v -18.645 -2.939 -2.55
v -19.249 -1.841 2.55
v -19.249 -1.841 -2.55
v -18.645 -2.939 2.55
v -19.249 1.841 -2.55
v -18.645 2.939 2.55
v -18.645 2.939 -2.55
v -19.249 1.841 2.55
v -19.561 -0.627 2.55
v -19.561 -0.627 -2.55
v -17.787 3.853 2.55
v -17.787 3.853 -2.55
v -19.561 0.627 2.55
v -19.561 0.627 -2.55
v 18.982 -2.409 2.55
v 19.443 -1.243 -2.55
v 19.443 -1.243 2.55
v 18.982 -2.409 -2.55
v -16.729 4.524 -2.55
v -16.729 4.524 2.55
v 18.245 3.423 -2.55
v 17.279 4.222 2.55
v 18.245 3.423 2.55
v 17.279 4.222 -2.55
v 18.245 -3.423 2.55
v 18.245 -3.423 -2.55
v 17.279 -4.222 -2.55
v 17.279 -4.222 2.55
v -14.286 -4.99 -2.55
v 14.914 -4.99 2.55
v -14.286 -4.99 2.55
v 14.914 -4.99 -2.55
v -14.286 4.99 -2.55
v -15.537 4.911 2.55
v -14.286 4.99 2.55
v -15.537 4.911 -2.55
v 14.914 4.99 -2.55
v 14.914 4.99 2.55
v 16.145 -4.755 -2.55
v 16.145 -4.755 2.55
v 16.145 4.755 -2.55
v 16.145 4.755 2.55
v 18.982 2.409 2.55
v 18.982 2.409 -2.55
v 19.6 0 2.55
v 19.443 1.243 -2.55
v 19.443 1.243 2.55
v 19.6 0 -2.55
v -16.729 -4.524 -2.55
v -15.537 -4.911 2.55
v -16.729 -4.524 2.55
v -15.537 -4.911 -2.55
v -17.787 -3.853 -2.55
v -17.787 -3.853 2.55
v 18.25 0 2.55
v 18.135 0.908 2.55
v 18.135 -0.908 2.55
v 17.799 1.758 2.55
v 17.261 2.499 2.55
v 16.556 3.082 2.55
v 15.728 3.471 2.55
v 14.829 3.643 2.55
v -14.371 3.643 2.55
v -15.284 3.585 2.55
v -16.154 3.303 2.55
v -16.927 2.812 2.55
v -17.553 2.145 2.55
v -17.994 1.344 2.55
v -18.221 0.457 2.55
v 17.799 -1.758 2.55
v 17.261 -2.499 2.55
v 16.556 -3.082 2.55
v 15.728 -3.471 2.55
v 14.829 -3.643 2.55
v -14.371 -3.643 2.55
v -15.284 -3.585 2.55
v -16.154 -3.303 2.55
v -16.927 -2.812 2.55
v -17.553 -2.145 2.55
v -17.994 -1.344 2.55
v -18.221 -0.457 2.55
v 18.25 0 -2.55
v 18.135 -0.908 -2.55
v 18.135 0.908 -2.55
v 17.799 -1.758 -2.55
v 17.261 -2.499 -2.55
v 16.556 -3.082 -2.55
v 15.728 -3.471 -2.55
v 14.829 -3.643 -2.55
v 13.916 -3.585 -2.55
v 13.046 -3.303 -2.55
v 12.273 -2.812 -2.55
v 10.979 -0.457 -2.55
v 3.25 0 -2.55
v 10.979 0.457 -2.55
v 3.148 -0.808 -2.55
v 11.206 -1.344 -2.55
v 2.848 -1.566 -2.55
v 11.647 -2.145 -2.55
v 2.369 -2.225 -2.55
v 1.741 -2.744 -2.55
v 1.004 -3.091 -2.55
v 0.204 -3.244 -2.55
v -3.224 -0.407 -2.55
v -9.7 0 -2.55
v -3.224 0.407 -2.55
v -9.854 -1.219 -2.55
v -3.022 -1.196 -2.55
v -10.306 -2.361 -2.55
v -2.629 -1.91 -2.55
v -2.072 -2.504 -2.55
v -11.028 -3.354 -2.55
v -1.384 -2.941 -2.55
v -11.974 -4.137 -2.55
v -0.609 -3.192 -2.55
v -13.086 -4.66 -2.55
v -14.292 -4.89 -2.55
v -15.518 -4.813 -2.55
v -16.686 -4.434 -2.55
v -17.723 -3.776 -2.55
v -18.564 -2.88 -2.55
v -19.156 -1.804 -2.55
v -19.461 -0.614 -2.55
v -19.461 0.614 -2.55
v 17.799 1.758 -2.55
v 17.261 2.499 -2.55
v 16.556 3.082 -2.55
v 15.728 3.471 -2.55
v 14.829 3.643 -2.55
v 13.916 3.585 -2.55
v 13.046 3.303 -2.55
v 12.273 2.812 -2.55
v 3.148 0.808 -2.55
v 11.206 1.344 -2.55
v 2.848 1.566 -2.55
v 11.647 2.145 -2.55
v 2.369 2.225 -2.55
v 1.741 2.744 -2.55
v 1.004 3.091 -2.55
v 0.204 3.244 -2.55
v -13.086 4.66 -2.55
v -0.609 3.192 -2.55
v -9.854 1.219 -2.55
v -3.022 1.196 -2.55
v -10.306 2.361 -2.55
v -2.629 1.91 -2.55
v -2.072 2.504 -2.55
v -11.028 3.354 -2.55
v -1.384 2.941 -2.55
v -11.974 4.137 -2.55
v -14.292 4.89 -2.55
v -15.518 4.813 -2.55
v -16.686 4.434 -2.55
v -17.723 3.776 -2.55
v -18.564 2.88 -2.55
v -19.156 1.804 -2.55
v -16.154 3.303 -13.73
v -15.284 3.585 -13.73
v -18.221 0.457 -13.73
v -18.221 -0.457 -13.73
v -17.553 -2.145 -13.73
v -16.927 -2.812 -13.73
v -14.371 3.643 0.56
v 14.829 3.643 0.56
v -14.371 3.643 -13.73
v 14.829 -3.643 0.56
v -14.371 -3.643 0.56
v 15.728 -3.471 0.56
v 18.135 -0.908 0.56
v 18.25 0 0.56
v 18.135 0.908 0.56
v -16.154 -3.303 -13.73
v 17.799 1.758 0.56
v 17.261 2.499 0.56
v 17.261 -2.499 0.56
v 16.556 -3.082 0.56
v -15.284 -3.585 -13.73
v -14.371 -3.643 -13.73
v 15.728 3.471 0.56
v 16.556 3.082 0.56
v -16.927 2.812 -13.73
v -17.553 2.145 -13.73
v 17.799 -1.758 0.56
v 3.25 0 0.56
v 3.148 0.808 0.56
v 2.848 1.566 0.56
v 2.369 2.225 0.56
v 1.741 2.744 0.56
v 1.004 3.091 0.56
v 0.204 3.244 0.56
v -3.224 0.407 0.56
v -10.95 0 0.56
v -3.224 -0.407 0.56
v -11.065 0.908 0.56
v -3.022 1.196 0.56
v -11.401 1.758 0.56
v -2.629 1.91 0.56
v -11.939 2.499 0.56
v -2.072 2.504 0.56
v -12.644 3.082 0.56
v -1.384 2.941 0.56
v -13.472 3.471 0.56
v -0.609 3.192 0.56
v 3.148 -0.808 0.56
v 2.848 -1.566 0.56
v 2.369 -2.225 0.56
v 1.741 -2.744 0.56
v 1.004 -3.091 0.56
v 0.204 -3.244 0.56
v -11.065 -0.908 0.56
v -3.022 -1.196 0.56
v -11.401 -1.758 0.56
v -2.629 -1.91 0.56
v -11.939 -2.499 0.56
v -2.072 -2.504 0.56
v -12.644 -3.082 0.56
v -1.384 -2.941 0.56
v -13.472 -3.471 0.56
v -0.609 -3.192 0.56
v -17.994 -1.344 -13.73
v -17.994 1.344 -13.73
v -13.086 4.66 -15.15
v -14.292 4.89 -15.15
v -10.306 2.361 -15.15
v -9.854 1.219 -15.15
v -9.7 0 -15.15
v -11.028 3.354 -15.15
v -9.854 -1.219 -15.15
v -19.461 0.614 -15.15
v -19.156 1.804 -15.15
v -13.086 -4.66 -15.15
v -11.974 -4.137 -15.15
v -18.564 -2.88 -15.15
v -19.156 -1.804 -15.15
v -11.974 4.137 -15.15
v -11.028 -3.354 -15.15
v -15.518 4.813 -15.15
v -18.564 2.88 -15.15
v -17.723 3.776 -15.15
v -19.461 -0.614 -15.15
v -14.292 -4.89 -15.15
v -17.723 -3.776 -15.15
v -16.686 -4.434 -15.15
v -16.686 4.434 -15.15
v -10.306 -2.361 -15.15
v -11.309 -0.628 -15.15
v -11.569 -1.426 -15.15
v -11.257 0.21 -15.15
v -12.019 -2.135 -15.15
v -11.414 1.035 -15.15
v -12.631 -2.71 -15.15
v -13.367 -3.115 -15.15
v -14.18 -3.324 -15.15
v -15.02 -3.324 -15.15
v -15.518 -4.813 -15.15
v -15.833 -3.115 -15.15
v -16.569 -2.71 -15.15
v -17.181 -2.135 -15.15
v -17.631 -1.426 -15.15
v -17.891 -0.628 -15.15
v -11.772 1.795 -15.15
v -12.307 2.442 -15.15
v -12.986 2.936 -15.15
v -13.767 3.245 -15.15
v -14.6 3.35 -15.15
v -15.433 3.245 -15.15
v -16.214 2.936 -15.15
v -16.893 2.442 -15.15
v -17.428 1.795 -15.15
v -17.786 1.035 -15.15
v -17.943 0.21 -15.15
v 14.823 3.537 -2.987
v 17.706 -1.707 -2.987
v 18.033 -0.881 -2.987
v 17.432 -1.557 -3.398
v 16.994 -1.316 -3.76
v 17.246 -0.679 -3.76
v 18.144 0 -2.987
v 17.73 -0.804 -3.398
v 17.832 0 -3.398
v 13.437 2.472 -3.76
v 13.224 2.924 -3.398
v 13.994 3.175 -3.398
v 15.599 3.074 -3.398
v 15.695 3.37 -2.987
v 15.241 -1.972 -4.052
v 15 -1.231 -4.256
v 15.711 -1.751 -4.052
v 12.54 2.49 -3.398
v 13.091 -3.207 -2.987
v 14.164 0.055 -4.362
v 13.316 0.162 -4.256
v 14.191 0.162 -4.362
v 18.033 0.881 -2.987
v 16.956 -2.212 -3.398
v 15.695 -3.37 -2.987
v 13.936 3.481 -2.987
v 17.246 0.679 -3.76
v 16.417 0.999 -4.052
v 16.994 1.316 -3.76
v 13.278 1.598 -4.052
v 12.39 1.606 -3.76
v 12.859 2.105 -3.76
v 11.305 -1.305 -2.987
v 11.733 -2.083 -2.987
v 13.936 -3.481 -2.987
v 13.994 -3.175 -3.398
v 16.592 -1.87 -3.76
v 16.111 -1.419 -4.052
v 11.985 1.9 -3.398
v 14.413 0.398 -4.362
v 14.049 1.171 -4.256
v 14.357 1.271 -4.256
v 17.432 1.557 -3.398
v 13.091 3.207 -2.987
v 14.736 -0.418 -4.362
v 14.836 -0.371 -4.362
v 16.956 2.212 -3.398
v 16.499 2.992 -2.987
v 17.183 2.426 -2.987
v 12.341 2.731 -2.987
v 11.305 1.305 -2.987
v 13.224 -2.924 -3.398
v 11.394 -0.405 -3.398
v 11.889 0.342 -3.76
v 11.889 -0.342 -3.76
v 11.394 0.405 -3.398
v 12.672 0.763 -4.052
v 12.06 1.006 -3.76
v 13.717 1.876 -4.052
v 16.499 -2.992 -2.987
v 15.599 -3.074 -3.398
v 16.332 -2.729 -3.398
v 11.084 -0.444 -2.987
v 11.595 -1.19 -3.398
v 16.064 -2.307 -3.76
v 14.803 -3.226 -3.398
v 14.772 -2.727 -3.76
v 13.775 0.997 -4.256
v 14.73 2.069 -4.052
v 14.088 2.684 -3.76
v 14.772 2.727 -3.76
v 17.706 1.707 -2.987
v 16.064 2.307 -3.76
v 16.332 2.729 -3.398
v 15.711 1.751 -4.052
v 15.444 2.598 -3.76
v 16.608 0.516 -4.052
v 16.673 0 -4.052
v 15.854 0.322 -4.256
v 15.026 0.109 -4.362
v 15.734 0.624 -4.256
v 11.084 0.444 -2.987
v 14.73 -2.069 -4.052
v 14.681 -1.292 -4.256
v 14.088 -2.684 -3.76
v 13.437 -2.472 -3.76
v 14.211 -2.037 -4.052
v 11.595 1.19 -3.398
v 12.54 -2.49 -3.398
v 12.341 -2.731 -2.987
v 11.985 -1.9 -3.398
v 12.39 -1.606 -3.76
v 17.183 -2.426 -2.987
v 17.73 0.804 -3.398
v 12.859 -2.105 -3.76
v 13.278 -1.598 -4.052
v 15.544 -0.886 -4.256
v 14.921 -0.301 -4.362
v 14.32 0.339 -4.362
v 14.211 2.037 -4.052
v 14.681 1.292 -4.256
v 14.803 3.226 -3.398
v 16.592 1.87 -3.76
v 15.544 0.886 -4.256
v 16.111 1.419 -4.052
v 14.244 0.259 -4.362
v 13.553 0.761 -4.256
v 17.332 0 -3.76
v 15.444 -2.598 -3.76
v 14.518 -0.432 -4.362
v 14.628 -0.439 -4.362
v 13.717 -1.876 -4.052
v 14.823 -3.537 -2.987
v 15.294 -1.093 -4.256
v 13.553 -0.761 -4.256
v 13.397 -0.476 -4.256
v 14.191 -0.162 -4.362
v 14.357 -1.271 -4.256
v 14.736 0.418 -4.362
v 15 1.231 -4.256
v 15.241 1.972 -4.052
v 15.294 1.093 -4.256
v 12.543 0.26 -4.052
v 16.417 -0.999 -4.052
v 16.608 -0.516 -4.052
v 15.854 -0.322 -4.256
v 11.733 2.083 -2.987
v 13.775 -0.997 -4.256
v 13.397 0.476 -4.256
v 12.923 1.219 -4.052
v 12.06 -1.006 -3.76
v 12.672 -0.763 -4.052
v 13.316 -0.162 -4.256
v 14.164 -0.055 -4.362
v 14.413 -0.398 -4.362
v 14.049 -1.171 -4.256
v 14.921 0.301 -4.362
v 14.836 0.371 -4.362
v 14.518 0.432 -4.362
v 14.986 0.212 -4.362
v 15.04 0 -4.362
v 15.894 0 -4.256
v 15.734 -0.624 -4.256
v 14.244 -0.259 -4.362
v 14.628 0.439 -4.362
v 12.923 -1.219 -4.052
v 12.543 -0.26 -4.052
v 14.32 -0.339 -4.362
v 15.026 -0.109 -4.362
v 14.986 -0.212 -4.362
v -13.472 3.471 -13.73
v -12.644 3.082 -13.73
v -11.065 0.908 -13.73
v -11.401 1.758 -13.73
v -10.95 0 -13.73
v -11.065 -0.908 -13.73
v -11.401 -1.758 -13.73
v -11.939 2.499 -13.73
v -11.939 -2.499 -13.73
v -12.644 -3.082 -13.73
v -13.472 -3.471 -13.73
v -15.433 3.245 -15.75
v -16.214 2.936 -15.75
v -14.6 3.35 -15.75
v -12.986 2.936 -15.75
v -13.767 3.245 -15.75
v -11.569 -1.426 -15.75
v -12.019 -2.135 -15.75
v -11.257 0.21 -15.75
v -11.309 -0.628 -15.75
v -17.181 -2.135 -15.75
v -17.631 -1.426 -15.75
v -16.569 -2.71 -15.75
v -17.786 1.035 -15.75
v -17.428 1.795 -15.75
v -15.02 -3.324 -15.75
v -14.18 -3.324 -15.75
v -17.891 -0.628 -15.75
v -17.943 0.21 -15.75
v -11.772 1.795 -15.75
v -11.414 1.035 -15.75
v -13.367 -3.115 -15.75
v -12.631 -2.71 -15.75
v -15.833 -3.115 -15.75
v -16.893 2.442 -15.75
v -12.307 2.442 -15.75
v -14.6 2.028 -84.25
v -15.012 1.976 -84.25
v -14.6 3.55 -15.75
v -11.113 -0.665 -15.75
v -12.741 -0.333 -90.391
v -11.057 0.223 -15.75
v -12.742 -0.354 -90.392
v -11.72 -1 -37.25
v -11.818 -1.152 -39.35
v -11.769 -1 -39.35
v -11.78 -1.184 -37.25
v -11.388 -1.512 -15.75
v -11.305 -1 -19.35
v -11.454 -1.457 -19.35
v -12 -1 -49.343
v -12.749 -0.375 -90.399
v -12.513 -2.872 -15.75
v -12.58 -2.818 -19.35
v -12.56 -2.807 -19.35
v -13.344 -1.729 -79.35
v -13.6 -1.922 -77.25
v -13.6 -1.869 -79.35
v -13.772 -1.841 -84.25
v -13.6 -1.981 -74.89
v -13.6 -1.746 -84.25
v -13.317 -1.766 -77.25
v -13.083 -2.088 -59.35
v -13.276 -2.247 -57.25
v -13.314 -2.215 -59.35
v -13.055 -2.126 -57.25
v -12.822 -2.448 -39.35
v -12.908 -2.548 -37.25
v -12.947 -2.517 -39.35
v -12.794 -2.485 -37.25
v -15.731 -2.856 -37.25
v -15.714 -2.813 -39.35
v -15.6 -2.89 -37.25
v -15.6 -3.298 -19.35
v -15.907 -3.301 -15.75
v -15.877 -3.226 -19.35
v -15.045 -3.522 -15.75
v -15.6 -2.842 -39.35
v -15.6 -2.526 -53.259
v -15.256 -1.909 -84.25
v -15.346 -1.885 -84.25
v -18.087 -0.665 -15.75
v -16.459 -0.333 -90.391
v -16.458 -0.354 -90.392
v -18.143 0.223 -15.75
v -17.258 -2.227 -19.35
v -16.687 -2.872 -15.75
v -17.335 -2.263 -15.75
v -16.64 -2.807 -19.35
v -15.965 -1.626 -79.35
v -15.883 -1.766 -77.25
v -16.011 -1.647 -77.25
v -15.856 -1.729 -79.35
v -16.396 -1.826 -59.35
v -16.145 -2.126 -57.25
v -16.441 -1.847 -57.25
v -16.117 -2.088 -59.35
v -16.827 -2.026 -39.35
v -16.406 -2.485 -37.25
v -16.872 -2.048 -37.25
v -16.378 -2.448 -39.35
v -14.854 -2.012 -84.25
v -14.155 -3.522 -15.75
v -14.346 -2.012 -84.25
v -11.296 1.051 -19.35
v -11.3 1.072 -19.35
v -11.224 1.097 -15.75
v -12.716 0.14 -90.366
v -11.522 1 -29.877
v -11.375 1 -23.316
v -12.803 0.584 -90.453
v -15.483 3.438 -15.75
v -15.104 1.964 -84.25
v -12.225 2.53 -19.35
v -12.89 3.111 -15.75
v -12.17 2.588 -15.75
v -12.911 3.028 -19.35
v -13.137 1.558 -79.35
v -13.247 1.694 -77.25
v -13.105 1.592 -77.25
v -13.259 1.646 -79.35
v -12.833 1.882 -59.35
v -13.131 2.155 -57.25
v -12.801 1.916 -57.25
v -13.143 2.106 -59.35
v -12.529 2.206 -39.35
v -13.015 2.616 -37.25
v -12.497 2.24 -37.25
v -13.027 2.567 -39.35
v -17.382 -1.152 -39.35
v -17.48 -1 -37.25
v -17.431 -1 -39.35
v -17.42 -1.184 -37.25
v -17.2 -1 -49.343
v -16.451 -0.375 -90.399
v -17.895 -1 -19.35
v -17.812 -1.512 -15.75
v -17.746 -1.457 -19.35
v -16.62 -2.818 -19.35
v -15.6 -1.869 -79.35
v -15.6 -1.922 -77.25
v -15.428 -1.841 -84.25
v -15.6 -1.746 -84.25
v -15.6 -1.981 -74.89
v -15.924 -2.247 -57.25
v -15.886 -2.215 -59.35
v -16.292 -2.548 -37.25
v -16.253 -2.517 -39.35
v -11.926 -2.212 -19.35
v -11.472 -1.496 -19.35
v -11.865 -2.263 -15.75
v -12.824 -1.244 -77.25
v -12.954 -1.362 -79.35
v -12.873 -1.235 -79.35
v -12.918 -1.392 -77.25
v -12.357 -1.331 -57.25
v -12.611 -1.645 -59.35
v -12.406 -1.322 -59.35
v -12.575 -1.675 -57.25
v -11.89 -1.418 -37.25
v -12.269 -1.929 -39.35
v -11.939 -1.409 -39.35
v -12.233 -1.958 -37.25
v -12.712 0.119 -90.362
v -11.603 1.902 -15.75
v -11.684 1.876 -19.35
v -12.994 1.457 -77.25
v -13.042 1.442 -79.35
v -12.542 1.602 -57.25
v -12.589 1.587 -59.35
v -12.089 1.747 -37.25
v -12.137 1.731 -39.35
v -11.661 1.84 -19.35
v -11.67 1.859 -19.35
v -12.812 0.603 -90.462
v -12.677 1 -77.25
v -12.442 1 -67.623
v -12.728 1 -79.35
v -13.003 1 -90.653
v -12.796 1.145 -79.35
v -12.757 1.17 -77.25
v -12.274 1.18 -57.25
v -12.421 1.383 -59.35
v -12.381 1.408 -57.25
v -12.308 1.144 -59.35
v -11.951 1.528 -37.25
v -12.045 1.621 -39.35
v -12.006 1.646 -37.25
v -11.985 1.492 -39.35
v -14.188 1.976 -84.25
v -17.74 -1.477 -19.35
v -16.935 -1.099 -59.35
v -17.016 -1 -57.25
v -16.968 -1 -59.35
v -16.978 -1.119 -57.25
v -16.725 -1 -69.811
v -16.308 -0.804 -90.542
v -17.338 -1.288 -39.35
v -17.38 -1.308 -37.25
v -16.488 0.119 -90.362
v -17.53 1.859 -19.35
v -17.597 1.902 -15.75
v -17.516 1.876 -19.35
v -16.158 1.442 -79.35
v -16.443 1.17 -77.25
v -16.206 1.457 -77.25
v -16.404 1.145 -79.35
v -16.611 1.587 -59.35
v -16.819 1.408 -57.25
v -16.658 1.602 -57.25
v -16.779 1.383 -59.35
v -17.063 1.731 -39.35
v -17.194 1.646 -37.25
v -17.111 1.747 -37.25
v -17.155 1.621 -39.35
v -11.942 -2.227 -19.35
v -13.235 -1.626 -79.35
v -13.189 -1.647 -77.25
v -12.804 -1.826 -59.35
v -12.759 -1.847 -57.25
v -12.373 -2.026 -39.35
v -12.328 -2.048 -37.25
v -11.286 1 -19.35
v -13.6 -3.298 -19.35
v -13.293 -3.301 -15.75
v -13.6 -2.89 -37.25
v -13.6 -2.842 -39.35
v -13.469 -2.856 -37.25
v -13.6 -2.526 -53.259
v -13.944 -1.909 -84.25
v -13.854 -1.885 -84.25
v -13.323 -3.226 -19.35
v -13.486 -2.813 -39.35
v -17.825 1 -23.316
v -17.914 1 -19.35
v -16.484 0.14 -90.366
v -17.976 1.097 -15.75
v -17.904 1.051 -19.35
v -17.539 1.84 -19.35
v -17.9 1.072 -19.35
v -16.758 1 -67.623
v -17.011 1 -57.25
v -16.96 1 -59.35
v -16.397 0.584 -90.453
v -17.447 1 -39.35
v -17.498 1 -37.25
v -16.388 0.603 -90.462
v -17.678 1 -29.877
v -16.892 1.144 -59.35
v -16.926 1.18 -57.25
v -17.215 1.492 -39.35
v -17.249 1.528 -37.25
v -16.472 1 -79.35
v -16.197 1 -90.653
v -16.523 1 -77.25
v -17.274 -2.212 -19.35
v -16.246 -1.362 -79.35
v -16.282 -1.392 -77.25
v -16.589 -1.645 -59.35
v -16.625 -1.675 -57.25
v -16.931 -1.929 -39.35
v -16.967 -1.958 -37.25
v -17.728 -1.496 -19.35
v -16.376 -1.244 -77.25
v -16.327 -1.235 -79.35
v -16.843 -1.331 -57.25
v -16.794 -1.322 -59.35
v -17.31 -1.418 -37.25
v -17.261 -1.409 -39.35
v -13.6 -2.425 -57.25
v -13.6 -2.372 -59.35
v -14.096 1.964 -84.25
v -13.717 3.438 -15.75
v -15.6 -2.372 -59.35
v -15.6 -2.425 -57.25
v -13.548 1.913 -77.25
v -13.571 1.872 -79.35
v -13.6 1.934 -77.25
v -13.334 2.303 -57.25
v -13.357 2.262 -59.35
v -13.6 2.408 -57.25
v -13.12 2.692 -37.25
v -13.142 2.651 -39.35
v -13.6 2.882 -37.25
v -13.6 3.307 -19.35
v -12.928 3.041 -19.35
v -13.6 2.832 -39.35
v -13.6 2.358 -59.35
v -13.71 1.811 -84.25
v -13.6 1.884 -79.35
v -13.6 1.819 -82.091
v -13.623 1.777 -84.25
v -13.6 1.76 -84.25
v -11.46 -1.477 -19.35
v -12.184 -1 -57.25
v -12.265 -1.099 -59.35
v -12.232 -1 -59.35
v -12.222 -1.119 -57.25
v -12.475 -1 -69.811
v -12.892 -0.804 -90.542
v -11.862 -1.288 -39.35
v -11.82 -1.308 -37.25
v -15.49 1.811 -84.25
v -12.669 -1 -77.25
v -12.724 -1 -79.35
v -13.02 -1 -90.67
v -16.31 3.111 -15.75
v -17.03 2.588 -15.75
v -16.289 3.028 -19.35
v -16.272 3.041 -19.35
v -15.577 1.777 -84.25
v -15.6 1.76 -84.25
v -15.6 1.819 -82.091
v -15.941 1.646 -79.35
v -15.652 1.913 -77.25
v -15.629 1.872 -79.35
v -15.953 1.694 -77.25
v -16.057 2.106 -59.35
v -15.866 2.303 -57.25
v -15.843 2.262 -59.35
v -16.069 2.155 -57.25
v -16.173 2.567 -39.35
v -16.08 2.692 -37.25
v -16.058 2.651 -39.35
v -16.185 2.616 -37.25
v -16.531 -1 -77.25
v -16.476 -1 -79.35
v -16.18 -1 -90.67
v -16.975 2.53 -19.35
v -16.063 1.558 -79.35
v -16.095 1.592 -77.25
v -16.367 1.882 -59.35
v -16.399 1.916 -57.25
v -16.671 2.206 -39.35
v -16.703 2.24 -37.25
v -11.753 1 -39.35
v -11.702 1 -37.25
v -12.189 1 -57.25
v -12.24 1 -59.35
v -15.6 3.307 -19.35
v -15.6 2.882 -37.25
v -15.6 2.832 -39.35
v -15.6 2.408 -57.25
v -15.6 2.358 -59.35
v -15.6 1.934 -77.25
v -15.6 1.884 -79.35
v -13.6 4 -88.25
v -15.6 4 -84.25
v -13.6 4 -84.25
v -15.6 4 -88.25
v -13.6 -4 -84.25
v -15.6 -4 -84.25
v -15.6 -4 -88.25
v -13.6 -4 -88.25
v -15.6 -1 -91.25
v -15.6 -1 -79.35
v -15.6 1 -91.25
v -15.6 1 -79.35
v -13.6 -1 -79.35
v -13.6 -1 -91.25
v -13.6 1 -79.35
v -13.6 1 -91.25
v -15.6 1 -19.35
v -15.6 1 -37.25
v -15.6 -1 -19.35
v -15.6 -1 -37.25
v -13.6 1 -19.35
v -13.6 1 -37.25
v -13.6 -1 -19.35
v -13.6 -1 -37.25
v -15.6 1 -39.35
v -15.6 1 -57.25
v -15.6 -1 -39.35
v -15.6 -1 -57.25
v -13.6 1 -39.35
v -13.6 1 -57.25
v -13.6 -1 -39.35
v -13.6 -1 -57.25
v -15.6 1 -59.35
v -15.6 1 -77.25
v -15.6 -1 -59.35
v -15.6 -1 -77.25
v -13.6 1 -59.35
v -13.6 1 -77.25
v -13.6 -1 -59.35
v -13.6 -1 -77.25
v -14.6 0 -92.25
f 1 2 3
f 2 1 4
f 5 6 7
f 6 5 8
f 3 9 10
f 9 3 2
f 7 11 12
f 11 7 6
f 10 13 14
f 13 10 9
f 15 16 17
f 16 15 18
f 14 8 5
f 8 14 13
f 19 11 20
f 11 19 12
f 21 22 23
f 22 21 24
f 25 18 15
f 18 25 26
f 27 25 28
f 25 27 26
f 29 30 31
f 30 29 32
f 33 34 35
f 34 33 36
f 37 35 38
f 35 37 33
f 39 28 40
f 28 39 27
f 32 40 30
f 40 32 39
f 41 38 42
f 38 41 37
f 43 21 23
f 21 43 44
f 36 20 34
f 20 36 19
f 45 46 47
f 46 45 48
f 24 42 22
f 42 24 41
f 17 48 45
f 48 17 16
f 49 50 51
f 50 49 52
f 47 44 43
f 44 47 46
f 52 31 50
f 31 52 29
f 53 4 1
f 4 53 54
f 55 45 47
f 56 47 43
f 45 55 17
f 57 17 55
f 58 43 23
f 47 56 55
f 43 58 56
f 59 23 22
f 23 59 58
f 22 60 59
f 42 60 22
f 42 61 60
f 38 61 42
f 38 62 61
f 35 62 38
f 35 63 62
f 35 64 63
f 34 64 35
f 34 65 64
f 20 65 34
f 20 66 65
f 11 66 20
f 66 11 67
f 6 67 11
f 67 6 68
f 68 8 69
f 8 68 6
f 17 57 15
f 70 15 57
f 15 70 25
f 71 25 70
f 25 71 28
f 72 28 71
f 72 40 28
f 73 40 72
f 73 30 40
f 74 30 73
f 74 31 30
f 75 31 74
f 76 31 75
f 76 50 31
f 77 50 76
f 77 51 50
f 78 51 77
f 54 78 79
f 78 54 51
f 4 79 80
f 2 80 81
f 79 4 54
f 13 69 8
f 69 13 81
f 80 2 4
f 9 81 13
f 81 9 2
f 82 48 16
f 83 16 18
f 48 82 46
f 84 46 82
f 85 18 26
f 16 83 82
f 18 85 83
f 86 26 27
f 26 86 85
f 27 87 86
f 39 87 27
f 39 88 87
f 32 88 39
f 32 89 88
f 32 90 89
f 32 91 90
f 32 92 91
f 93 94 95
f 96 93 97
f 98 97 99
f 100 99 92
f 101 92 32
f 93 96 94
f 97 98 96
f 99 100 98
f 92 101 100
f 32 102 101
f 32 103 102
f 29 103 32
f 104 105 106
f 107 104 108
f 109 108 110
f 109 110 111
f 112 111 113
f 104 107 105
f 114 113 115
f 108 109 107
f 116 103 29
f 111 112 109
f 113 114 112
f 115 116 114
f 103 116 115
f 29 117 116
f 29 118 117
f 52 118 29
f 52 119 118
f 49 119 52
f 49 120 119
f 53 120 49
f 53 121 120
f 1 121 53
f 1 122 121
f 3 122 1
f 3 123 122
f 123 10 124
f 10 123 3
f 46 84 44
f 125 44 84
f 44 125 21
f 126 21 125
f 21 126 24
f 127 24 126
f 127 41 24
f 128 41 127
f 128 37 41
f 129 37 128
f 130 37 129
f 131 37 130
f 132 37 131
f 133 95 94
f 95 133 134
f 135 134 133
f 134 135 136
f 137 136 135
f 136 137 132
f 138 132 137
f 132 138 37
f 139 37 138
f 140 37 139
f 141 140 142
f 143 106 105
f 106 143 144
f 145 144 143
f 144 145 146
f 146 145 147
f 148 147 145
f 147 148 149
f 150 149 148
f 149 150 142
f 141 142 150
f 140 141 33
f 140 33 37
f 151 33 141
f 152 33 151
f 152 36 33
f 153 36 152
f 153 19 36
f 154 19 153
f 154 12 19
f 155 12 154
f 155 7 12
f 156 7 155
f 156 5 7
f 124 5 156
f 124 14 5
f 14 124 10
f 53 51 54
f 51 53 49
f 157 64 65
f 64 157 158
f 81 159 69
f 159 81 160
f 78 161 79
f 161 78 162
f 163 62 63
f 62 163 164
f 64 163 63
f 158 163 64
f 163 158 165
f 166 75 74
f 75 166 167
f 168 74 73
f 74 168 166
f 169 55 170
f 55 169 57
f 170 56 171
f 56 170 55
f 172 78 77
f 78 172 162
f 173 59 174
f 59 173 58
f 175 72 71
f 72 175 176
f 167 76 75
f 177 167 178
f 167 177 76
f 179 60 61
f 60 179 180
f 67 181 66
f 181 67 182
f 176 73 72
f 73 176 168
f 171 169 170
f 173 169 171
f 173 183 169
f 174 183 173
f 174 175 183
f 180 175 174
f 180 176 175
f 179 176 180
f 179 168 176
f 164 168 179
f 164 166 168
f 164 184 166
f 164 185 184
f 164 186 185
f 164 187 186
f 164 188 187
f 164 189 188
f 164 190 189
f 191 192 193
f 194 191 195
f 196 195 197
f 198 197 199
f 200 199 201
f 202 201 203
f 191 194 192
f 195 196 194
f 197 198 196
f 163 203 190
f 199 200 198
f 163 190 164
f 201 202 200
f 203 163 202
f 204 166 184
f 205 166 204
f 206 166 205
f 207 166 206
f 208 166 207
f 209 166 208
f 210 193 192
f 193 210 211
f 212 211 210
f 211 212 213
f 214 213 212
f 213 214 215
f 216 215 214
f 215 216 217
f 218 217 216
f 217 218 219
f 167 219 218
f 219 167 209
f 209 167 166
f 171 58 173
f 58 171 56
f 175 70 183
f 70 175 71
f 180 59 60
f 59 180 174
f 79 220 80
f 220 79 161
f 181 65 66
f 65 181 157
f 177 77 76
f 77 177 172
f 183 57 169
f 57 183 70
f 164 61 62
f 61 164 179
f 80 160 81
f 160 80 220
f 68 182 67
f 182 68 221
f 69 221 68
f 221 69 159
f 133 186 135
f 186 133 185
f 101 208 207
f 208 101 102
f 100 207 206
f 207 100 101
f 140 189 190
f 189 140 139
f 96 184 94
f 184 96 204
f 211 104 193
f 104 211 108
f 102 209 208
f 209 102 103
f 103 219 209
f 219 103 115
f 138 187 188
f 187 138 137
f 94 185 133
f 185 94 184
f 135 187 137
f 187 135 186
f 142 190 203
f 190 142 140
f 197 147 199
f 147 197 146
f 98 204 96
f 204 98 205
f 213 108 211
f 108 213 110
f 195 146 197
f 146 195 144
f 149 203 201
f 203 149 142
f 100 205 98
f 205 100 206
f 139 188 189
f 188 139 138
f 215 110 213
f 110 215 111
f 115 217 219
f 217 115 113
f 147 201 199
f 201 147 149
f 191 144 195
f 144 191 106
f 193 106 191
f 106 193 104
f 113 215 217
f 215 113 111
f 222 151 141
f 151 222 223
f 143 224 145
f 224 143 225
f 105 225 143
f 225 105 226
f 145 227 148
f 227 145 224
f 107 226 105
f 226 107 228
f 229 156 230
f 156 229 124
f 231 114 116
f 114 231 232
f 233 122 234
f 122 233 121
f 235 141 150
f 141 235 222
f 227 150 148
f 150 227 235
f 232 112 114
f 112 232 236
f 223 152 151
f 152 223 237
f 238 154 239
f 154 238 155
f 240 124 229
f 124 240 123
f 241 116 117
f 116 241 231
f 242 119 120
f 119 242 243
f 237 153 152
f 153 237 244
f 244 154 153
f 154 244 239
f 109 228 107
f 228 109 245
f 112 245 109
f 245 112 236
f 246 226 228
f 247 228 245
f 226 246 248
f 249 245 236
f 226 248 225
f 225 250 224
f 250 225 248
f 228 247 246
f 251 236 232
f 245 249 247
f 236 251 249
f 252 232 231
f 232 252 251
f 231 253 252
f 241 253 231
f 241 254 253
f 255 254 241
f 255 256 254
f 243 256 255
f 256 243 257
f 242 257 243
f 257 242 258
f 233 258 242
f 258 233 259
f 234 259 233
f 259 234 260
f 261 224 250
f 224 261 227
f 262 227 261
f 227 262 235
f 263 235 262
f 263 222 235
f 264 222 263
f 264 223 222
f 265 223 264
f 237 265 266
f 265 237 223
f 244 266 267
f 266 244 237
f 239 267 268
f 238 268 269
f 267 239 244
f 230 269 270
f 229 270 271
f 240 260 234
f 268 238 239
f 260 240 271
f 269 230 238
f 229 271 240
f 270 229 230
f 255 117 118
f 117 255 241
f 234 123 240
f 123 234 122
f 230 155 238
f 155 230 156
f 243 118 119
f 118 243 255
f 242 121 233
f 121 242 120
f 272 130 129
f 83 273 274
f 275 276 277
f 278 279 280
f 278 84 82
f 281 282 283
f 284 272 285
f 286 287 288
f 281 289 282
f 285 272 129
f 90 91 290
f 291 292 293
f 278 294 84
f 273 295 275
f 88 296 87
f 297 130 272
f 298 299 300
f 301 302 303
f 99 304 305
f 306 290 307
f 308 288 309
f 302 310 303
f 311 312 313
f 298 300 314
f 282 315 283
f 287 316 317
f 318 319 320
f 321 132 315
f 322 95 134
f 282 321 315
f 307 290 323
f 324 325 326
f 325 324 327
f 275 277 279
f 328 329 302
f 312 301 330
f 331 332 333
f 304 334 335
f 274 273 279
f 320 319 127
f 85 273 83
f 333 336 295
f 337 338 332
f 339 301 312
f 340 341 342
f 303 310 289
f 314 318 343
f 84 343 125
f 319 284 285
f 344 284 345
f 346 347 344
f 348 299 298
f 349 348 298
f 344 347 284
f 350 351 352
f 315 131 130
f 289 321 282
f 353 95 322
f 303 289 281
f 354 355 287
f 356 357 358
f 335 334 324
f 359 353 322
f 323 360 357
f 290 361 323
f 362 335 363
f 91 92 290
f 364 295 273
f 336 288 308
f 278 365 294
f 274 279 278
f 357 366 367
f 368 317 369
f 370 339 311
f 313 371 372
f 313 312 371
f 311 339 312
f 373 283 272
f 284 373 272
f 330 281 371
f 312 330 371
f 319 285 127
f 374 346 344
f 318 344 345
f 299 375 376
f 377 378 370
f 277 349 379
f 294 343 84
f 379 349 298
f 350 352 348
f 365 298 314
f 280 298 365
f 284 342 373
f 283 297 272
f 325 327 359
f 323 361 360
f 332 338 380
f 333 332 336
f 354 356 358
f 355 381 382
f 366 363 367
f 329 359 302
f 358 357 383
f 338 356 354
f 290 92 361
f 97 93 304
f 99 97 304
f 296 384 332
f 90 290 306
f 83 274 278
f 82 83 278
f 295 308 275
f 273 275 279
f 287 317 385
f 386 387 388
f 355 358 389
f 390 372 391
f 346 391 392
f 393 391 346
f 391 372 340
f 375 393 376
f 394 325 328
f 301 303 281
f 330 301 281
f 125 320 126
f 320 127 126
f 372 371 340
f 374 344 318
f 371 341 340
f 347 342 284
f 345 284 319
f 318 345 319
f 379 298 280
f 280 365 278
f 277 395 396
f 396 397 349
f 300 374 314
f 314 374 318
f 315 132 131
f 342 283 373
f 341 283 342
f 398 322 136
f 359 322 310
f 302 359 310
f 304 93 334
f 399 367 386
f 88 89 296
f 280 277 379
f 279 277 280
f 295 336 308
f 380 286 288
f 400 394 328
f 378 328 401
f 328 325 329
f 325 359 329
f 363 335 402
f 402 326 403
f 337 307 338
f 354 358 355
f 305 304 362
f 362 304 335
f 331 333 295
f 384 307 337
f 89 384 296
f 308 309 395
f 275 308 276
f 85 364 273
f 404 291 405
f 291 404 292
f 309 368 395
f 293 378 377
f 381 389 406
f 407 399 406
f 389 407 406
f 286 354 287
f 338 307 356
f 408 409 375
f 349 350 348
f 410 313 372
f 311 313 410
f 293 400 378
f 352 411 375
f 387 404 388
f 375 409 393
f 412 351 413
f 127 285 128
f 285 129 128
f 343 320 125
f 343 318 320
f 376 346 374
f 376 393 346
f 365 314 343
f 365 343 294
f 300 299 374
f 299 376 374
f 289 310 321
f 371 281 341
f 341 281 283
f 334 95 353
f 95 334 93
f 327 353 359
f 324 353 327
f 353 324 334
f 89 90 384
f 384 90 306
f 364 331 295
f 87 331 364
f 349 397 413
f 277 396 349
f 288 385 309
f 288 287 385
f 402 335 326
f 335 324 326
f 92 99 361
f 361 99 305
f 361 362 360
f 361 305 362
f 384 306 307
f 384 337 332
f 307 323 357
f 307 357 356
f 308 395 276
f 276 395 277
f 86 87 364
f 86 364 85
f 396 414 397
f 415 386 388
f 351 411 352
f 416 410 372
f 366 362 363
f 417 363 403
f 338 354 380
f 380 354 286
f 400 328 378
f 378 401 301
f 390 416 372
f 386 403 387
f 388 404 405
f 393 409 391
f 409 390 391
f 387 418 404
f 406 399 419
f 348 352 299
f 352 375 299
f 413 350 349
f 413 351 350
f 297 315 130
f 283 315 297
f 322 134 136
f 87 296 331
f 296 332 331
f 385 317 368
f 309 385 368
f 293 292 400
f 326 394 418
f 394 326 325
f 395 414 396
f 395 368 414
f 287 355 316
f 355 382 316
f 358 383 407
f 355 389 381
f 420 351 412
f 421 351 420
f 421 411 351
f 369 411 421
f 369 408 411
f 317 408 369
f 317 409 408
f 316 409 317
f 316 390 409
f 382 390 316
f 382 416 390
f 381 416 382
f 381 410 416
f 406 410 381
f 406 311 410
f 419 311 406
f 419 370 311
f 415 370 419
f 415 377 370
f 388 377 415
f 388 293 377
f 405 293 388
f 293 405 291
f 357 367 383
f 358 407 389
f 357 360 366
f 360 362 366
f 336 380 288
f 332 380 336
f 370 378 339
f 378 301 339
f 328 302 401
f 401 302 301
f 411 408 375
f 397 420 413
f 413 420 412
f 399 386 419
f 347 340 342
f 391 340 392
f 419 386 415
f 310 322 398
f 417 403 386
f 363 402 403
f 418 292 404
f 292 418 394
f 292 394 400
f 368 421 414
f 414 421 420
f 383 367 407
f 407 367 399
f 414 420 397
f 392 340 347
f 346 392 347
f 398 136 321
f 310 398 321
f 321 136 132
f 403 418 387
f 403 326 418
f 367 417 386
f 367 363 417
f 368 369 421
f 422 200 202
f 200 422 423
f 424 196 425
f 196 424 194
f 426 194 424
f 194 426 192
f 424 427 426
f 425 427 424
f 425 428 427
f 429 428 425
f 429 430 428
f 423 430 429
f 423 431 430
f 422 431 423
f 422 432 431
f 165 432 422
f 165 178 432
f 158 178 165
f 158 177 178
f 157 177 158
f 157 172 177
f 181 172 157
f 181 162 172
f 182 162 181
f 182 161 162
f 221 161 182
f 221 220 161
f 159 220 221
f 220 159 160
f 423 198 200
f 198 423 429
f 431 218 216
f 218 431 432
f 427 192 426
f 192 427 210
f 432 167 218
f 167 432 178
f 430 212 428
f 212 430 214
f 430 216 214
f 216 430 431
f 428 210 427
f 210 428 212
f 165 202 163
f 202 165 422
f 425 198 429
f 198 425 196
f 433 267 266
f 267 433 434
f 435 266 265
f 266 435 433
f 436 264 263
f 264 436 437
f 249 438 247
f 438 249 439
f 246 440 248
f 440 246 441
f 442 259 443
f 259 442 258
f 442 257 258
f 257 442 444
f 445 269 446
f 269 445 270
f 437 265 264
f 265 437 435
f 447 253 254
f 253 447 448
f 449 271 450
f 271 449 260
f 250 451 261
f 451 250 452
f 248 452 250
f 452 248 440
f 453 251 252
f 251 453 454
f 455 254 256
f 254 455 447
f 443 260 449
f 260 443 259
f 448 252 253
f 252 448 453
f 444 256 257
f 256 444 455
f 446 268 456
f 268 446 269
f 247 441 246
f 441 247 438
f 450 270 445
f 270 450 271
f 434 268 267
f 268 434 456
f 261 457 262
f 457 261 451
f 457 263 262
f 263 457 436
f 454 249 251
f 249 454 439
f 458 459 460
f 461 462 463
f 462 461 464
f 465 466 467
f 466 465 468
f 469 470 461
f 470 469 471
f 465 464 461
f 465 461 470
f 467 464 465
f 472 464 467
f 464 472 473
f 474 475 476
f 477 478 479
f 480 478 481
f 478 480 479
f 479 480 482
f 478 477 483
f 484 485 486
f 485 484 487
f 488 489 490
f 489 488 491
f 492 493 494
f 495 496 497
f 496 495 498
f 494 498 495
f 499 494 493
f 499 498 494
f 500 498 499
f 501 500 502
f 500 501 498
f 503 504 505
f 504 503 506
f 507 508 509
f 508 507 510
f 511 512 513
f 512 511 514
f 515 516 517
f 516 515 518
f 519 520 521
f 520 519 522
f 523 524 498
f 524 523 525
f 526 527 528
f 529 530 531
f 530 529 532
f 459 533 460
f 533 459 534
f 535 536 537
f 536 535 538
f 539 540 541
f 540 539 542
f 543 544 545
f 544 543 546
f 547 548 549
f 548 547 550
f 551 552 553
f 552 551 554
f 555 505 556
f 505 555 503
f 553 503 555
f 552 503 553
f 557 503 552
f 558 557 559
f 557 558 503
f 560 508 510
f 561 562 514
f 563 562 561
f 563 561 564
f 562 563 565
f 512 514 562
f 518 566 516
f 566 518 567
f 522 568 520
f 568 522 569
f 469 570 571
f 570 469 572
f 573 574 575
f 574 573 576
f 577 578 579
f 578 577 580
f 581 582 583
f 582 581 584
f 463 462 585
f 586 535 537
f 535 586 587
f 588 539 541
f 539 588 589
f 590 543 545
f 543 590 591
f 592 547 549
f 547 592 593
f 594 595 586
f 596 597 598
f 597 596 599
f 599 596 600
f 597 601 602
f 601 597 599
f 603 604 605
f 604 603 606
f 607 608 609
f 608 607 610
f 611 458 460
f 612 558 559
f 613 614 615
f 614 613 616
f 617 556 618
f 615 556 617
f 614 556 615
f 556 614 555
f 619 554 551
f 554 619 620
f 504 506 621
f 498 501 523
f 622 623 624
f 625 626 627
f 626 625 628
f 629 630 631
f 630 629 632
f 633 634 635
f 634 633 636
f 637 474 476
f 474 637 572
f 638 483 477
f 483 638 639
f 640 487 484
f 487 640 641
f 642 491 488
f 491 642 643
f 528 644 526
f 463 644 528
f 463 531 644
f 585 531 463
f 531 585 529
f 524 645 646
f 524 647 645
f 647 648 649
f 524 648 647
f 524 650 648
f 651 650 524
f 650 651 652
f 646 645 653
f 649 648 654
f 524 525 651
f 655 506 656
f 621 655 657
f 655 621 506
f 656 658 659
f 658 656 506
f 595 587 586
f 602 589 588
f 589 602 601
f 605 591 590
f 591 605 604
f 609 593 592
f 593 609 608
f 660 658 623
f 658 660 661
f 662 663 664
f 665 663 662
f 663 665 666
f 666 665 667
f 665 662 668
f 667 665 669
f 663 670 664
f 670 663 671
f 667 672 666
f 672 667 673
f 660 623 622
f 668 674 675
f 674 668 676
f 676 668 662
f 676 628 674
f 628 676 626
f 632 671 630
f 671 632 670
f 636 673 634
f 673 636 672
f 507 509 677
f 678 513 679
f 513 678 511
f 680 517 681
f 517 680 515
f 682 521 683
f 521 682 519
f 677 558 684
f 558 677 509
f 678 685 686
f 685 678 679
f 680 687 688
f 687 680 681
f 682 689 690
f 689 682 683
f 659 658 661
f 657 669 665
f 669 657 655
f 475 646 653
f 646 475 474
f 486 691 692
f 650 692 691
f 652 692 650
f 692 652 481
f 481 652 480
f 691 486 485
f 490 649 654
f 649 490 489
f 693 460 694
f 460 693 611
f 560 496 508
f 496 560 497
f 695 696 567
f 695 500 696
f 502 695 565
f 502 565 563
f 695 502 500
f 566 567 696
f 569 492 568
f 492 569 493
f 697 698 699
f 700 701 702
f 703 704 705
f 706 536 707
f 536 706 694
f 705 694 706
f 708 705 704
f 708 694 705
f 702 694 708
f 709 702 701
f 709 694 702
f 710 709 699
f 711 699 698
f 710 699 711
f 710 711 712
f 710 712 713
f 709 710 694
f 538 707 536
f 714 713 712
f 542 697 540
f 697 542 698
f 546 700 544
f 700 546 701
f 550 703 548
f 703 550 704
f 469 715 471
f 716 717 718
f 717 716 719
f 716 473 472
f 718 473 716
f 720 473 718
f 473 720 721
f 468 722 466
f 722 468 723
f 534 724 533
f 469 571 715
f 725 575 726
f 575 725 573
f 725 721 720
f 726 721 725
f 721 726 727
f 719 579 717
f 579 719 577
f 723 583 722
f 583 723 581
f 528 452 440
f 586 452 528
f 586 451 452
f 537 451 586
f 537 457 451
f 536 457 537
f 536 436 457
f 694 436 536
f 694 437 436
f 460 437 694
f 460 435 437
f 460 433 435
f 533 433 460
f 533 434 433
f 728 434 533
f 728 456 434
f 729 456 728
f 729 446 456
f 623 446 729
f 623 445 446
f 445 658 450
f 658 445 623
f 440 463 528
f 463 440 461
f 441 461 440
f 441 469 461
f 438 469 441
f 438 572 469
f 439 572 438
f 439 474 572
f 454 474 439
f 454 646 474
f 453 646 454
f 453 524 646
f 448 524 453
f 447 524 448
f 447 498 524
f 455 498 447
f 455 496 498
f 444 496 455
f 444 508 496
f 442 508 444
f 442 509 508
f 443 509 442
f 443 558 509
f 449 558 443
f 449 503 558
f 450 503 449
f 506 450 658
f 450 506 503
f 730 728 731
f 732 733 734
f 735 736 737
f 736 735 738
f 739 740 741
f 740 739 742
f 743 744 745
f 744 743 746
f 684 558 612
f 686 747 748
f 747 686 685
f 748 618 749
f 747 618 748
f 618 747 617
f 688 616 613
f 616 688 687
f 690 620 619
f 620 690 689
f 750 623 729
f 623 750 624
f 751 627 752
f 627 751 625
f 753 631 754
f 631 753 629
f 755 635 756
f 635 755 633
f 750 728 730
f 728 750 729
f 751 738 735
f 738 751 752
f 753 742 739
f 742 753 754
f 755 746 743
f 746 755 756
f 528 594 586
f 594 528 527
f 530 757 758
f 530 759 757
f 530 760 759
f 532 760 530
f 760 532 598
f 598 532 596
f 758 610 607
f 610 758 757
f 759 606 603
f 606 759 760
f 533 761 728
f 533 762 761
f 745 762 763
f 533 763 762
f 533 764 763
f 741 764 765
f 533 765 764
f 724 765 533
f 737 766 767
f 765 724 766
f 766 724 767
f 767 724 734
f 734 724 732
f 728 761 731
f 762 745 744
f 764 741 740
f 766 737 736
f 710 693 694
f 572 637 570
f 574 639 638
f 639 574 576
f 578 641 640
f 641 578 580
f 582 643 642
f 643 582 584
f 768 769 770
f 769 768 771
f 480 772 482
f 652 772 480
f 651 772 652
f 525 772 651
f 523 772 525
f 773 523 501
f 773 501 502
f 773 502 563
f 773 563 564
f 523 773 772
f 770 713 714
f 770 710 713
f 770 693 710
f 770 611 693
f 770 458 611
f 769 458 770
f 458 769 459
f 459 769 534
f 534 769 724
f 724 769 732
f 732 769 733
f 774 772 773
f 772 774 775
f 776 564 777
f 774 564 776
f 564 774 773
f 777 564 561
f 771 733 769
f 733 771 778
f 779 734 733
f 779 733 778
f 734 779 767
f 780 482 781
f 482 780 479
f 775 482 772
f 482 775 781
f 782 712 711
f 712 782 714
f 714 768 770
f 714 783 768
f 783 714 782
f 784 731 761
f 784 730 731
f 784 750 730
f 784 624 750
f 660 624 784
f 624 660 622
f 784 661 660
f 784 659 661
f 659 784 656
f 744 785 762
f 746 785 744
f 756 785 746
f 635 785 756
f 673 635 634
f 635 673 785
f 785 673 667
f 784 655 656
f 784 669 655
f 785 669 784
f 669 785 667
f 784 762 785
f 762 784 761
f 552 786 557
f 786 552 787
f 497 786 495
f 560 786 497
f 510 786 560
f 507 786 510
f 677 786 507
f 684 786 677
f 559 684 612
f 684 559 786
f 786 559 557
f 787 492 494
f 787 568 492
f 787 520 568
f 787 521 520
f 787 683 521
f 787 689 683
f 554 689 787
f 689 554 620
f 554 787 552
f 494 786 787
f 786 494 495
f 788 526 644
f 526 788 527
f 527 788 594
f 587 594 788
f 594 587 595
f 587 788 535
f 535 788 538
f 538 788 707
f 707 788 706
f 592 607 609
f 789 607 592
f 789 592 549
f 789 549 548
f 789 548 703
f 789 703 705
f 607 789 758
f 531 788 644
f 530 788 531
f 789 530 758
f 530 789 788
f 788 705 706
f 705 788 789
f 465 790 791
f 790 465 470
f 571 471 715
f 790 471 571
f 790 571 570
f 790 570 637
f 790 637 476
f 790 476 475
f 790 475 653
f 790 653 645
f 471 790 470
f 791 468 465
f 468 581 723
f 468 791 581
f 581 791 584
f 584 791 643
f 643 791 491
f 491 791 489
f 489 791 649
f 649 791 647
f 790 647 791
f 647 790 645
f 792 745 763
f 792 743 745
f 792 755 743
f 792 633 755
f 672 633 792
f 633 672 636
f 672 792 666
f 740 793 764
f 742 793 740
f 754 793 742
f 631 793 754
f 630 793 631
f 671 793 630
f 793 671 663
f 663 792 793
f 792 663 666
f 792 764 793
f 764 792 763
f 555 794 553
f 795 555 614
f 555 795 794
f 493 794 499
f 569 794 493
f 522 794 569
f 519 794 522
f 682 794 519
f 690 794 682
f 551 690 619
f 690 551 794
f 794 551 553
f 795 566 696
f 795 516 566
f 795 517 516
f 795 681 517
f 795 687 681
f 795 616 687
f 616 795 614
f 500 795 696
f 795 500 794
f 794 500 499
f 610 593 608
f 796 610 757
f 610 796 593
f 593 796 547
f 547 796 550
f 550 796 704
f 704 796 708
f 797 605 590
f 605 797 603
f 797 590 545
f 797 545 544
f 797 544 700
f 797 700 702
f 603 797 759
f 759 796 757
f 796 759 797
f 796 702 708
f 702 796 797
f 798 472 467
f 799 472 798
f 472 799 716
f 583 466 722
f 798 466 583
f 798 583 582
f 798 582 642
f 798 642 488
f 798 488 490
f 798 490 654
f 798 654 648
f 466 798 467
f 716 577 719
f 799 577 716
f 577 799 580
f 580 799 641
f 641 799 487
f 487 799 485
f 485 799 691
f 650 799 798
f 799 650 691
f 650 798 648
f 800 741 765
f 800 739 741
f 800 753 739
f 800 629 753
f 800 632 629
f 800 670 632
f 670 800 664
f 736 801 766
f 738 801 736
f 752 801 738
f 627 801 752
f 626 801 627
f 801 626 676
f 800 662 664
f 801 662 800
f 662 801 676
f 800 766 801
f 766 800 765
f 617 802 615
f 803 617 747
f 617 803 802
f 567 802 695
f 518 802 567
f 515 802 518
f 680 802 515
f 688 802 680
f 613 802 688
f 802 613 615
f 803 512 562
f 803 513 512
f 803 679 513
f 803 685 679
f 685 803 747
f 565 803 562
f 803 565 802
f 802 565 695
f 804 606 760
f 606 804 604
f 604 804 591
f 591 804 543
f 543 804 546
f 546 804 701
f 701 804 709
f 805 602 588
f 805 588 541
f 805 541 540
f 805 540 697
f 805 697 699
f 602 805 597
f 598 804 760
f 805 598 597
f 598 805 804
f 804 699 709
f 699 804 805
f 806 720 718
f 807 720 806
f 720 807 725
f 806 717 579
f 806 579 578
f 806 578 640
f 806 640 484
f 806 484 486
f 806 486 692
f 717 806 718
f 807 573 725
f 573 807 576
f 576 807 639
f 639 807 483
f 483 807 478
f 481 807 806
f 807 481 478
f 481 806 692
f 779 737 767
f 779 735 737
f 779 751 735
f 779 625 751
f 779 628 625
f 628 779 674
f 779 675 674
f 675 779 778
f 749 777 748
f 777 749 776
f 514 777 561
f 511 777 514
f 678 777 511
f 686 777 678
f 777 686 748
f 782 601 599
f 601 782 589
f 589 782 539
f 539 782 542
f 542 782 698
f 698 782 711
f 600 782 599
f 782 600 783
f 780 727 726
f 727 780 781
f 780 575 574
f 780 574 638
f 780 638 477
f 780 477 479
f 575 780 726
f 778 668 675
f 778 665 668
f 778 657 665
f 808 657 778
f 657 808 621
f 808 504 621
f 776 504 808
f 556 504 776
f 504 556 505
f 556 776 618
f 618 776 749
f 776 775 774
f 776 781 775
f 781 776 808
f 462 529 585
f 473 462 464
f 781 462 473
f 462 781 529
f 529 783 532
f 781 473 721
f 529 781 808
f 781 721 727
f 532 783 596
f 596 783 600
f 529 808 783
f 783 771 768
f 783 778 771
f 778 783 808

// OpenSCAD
// OpenSCAD definition for Acorn Risc PC Locking Pin(s)
//
// This was measured from a real Risc PC locking pin to 0.1mm accuracy.
//
// by David Thomas, 31-Jan-25
//

$fn = 25; // detail level

Epsilon = 0.01; // aka bodge factor

HandleWidth = 39.2;
HandleDepth = 10;
HandleHeight = 5.1;
HandleLipWidth = 1.35; // width of lip around edge of handle
HandleLipHeight = 2;

LockHoleDiameter = 6.5;

StemHoleDiameter = HandleDepth - HandleLipWidth * 2;
StemHoleDepth = 14.3;

StemUpperDiametermeter = 9.8;
StemTopDepth = 12.6;

SphereDiameter = HandleDepth - HandleLipWidth * 2;
SphereHeight = 1.4;

StemHeight = 76.5; // has rubber inset deducted
StemUpperDiameter = 7.1;
StemBottomDiameter = 3.7; // guess

StemRubberInsetHeight = 1.3; // recess for rubber band to sit in
StemRubberInsetDiameter = 6.7;

StemCutoutWidth = 4;
StemCutoutDepth = 4;
StemCutoutHeight = 17.9;
StemCutoutInterval = 20;

BarbWidth = 8;
BarbDepth = 2;
BarbHeight = 8;

StemHoleCentre = -(HandleWidth - HandleDepth) / 2; // where the stem is centred

module capsule(width, radius) {
    hull() {
        x = width / 2 - radius;
        translate([-x, 0, 0]) circle(r = radius);
        translate([+x, 0, 0]) circle(r = radius);
    }
}

module rear_pin_top_flat() {
    difference() {
        linear_extrude(HandleHeight, center = true)
            capsule(HandleWidth, HandleDepth / 2);
            
        translate([0, 0, (HandleHeight - HandleLipHeight) / 2 + Epsilon])
            linear_extrude(HandleLipHeight, center = true)
                capsule(HandleWidth - HandleLipWidth * 2, HandleDepth / 2 - HandleLipWidth);
        
        // cut centre hole
        cylinder(h = HandleHeight + Epsilon, d = LockHoleDiameter, center = true);
    }
}

module rear_pin_top() {
    difference() {
        union() {
            rear_pin_top_flat();
            
            translate([-(HandleWidth - HandleDepth) / 2, 0, -(HandleHeight + StemTopDepth) / 2])
                cylinder(h = StemTopDepth, d = StemUpperDiametermeter, center = true);
        
            translate([(HandleWidth - HandleDepth) / 2, 0, -HandleHeight / 2])
                scale([1, 1, 0.5])
                    sphere(d = SphereDiameter);
        }
        
        // cut bigger hole towards stem
        t = HandleHeight / 2 - HandleLipHeight + 2 * Epsilon; // needed extra bodge
        translate([StemHoleCentre, 0, -StemHoleDepth / 2 + t])
            cylinder(h = StemHoleDepth, d = StemHoleDiameter, center = true);
   }
}

// TODO
module front_pin_top() {
}

module stemcutter(z) {
    x = (StemCutoutWidth + 2) / 2;
    d = (StemCutoutDepth + 2) / 2;
    translate([0, 0, z - StemCutoutHeight / 2]) {
        translate([x, d, 0])
            cube([StemCutoutWidth, StemCutoutDepth, StemCutoutHeight], center = true);
        translate([-x, d, 0])
            cube([StemCutoutWidth, StemCutoutDepth, StemCutoutHeight], center = true);
        translate([x, -d, 0])
            cube([StemCutoutWidth, StemCutoutDepth, StemCutoutHeight], center = true);
        translate([-x, -d, 0])
            cube([StemCutoutWidth, StemCutoutDepth, StemCutoutHeight], center = true);
    }
}

// TODO causes unclosed mesh or vanishing somehow
module barbcutter() {
    scale(4 + Epsilon)
        translate([0, 0, 1])
            union() {
                for (a = [0:3])
                    rotate([0, 90, a * 90])
                        linear_extrude(height = 1, center = true)
                            polygon([[1,0], [1,1], [0,1]]);
            }
}

module stem() {
    difference() {
        union() {
            // rubber inset
            translate([0, 0, StemHeight / 2])
                cylinder(h = StemRubberInsetHeight, d = StemRubberInsetDiameter, center = true);

            // main conical cylinder
            cylinder(h = StemHeight, d1 = StemBottomDiameter, d2 = StemUpperDiameter, center = true);
            
            difference() {
                translate([0, 0, -StemHeight / 2 + BarbHeight / 2])
                    cube([BarbWidth, BarbDepth, BarbHeight], center = true);
            }
        }

        // cut away the cuboid sections of stem
        z = (StemHeight / 2) - (21 - 17.4); // fix
        for (a = [0:3])  // will need >3 for longer pins
            stemcutter(z - StemCutoutInterval * a);
        
        // cut the barb
        translate([0, 0, -StemHeight / 2])
            barbcutter();
   }
}

union() {
    rear_pin_top();
    translate([StemHoleCentre, 0, -54]) // fix
        rotate([0, 0, 90])
            stem();
}
